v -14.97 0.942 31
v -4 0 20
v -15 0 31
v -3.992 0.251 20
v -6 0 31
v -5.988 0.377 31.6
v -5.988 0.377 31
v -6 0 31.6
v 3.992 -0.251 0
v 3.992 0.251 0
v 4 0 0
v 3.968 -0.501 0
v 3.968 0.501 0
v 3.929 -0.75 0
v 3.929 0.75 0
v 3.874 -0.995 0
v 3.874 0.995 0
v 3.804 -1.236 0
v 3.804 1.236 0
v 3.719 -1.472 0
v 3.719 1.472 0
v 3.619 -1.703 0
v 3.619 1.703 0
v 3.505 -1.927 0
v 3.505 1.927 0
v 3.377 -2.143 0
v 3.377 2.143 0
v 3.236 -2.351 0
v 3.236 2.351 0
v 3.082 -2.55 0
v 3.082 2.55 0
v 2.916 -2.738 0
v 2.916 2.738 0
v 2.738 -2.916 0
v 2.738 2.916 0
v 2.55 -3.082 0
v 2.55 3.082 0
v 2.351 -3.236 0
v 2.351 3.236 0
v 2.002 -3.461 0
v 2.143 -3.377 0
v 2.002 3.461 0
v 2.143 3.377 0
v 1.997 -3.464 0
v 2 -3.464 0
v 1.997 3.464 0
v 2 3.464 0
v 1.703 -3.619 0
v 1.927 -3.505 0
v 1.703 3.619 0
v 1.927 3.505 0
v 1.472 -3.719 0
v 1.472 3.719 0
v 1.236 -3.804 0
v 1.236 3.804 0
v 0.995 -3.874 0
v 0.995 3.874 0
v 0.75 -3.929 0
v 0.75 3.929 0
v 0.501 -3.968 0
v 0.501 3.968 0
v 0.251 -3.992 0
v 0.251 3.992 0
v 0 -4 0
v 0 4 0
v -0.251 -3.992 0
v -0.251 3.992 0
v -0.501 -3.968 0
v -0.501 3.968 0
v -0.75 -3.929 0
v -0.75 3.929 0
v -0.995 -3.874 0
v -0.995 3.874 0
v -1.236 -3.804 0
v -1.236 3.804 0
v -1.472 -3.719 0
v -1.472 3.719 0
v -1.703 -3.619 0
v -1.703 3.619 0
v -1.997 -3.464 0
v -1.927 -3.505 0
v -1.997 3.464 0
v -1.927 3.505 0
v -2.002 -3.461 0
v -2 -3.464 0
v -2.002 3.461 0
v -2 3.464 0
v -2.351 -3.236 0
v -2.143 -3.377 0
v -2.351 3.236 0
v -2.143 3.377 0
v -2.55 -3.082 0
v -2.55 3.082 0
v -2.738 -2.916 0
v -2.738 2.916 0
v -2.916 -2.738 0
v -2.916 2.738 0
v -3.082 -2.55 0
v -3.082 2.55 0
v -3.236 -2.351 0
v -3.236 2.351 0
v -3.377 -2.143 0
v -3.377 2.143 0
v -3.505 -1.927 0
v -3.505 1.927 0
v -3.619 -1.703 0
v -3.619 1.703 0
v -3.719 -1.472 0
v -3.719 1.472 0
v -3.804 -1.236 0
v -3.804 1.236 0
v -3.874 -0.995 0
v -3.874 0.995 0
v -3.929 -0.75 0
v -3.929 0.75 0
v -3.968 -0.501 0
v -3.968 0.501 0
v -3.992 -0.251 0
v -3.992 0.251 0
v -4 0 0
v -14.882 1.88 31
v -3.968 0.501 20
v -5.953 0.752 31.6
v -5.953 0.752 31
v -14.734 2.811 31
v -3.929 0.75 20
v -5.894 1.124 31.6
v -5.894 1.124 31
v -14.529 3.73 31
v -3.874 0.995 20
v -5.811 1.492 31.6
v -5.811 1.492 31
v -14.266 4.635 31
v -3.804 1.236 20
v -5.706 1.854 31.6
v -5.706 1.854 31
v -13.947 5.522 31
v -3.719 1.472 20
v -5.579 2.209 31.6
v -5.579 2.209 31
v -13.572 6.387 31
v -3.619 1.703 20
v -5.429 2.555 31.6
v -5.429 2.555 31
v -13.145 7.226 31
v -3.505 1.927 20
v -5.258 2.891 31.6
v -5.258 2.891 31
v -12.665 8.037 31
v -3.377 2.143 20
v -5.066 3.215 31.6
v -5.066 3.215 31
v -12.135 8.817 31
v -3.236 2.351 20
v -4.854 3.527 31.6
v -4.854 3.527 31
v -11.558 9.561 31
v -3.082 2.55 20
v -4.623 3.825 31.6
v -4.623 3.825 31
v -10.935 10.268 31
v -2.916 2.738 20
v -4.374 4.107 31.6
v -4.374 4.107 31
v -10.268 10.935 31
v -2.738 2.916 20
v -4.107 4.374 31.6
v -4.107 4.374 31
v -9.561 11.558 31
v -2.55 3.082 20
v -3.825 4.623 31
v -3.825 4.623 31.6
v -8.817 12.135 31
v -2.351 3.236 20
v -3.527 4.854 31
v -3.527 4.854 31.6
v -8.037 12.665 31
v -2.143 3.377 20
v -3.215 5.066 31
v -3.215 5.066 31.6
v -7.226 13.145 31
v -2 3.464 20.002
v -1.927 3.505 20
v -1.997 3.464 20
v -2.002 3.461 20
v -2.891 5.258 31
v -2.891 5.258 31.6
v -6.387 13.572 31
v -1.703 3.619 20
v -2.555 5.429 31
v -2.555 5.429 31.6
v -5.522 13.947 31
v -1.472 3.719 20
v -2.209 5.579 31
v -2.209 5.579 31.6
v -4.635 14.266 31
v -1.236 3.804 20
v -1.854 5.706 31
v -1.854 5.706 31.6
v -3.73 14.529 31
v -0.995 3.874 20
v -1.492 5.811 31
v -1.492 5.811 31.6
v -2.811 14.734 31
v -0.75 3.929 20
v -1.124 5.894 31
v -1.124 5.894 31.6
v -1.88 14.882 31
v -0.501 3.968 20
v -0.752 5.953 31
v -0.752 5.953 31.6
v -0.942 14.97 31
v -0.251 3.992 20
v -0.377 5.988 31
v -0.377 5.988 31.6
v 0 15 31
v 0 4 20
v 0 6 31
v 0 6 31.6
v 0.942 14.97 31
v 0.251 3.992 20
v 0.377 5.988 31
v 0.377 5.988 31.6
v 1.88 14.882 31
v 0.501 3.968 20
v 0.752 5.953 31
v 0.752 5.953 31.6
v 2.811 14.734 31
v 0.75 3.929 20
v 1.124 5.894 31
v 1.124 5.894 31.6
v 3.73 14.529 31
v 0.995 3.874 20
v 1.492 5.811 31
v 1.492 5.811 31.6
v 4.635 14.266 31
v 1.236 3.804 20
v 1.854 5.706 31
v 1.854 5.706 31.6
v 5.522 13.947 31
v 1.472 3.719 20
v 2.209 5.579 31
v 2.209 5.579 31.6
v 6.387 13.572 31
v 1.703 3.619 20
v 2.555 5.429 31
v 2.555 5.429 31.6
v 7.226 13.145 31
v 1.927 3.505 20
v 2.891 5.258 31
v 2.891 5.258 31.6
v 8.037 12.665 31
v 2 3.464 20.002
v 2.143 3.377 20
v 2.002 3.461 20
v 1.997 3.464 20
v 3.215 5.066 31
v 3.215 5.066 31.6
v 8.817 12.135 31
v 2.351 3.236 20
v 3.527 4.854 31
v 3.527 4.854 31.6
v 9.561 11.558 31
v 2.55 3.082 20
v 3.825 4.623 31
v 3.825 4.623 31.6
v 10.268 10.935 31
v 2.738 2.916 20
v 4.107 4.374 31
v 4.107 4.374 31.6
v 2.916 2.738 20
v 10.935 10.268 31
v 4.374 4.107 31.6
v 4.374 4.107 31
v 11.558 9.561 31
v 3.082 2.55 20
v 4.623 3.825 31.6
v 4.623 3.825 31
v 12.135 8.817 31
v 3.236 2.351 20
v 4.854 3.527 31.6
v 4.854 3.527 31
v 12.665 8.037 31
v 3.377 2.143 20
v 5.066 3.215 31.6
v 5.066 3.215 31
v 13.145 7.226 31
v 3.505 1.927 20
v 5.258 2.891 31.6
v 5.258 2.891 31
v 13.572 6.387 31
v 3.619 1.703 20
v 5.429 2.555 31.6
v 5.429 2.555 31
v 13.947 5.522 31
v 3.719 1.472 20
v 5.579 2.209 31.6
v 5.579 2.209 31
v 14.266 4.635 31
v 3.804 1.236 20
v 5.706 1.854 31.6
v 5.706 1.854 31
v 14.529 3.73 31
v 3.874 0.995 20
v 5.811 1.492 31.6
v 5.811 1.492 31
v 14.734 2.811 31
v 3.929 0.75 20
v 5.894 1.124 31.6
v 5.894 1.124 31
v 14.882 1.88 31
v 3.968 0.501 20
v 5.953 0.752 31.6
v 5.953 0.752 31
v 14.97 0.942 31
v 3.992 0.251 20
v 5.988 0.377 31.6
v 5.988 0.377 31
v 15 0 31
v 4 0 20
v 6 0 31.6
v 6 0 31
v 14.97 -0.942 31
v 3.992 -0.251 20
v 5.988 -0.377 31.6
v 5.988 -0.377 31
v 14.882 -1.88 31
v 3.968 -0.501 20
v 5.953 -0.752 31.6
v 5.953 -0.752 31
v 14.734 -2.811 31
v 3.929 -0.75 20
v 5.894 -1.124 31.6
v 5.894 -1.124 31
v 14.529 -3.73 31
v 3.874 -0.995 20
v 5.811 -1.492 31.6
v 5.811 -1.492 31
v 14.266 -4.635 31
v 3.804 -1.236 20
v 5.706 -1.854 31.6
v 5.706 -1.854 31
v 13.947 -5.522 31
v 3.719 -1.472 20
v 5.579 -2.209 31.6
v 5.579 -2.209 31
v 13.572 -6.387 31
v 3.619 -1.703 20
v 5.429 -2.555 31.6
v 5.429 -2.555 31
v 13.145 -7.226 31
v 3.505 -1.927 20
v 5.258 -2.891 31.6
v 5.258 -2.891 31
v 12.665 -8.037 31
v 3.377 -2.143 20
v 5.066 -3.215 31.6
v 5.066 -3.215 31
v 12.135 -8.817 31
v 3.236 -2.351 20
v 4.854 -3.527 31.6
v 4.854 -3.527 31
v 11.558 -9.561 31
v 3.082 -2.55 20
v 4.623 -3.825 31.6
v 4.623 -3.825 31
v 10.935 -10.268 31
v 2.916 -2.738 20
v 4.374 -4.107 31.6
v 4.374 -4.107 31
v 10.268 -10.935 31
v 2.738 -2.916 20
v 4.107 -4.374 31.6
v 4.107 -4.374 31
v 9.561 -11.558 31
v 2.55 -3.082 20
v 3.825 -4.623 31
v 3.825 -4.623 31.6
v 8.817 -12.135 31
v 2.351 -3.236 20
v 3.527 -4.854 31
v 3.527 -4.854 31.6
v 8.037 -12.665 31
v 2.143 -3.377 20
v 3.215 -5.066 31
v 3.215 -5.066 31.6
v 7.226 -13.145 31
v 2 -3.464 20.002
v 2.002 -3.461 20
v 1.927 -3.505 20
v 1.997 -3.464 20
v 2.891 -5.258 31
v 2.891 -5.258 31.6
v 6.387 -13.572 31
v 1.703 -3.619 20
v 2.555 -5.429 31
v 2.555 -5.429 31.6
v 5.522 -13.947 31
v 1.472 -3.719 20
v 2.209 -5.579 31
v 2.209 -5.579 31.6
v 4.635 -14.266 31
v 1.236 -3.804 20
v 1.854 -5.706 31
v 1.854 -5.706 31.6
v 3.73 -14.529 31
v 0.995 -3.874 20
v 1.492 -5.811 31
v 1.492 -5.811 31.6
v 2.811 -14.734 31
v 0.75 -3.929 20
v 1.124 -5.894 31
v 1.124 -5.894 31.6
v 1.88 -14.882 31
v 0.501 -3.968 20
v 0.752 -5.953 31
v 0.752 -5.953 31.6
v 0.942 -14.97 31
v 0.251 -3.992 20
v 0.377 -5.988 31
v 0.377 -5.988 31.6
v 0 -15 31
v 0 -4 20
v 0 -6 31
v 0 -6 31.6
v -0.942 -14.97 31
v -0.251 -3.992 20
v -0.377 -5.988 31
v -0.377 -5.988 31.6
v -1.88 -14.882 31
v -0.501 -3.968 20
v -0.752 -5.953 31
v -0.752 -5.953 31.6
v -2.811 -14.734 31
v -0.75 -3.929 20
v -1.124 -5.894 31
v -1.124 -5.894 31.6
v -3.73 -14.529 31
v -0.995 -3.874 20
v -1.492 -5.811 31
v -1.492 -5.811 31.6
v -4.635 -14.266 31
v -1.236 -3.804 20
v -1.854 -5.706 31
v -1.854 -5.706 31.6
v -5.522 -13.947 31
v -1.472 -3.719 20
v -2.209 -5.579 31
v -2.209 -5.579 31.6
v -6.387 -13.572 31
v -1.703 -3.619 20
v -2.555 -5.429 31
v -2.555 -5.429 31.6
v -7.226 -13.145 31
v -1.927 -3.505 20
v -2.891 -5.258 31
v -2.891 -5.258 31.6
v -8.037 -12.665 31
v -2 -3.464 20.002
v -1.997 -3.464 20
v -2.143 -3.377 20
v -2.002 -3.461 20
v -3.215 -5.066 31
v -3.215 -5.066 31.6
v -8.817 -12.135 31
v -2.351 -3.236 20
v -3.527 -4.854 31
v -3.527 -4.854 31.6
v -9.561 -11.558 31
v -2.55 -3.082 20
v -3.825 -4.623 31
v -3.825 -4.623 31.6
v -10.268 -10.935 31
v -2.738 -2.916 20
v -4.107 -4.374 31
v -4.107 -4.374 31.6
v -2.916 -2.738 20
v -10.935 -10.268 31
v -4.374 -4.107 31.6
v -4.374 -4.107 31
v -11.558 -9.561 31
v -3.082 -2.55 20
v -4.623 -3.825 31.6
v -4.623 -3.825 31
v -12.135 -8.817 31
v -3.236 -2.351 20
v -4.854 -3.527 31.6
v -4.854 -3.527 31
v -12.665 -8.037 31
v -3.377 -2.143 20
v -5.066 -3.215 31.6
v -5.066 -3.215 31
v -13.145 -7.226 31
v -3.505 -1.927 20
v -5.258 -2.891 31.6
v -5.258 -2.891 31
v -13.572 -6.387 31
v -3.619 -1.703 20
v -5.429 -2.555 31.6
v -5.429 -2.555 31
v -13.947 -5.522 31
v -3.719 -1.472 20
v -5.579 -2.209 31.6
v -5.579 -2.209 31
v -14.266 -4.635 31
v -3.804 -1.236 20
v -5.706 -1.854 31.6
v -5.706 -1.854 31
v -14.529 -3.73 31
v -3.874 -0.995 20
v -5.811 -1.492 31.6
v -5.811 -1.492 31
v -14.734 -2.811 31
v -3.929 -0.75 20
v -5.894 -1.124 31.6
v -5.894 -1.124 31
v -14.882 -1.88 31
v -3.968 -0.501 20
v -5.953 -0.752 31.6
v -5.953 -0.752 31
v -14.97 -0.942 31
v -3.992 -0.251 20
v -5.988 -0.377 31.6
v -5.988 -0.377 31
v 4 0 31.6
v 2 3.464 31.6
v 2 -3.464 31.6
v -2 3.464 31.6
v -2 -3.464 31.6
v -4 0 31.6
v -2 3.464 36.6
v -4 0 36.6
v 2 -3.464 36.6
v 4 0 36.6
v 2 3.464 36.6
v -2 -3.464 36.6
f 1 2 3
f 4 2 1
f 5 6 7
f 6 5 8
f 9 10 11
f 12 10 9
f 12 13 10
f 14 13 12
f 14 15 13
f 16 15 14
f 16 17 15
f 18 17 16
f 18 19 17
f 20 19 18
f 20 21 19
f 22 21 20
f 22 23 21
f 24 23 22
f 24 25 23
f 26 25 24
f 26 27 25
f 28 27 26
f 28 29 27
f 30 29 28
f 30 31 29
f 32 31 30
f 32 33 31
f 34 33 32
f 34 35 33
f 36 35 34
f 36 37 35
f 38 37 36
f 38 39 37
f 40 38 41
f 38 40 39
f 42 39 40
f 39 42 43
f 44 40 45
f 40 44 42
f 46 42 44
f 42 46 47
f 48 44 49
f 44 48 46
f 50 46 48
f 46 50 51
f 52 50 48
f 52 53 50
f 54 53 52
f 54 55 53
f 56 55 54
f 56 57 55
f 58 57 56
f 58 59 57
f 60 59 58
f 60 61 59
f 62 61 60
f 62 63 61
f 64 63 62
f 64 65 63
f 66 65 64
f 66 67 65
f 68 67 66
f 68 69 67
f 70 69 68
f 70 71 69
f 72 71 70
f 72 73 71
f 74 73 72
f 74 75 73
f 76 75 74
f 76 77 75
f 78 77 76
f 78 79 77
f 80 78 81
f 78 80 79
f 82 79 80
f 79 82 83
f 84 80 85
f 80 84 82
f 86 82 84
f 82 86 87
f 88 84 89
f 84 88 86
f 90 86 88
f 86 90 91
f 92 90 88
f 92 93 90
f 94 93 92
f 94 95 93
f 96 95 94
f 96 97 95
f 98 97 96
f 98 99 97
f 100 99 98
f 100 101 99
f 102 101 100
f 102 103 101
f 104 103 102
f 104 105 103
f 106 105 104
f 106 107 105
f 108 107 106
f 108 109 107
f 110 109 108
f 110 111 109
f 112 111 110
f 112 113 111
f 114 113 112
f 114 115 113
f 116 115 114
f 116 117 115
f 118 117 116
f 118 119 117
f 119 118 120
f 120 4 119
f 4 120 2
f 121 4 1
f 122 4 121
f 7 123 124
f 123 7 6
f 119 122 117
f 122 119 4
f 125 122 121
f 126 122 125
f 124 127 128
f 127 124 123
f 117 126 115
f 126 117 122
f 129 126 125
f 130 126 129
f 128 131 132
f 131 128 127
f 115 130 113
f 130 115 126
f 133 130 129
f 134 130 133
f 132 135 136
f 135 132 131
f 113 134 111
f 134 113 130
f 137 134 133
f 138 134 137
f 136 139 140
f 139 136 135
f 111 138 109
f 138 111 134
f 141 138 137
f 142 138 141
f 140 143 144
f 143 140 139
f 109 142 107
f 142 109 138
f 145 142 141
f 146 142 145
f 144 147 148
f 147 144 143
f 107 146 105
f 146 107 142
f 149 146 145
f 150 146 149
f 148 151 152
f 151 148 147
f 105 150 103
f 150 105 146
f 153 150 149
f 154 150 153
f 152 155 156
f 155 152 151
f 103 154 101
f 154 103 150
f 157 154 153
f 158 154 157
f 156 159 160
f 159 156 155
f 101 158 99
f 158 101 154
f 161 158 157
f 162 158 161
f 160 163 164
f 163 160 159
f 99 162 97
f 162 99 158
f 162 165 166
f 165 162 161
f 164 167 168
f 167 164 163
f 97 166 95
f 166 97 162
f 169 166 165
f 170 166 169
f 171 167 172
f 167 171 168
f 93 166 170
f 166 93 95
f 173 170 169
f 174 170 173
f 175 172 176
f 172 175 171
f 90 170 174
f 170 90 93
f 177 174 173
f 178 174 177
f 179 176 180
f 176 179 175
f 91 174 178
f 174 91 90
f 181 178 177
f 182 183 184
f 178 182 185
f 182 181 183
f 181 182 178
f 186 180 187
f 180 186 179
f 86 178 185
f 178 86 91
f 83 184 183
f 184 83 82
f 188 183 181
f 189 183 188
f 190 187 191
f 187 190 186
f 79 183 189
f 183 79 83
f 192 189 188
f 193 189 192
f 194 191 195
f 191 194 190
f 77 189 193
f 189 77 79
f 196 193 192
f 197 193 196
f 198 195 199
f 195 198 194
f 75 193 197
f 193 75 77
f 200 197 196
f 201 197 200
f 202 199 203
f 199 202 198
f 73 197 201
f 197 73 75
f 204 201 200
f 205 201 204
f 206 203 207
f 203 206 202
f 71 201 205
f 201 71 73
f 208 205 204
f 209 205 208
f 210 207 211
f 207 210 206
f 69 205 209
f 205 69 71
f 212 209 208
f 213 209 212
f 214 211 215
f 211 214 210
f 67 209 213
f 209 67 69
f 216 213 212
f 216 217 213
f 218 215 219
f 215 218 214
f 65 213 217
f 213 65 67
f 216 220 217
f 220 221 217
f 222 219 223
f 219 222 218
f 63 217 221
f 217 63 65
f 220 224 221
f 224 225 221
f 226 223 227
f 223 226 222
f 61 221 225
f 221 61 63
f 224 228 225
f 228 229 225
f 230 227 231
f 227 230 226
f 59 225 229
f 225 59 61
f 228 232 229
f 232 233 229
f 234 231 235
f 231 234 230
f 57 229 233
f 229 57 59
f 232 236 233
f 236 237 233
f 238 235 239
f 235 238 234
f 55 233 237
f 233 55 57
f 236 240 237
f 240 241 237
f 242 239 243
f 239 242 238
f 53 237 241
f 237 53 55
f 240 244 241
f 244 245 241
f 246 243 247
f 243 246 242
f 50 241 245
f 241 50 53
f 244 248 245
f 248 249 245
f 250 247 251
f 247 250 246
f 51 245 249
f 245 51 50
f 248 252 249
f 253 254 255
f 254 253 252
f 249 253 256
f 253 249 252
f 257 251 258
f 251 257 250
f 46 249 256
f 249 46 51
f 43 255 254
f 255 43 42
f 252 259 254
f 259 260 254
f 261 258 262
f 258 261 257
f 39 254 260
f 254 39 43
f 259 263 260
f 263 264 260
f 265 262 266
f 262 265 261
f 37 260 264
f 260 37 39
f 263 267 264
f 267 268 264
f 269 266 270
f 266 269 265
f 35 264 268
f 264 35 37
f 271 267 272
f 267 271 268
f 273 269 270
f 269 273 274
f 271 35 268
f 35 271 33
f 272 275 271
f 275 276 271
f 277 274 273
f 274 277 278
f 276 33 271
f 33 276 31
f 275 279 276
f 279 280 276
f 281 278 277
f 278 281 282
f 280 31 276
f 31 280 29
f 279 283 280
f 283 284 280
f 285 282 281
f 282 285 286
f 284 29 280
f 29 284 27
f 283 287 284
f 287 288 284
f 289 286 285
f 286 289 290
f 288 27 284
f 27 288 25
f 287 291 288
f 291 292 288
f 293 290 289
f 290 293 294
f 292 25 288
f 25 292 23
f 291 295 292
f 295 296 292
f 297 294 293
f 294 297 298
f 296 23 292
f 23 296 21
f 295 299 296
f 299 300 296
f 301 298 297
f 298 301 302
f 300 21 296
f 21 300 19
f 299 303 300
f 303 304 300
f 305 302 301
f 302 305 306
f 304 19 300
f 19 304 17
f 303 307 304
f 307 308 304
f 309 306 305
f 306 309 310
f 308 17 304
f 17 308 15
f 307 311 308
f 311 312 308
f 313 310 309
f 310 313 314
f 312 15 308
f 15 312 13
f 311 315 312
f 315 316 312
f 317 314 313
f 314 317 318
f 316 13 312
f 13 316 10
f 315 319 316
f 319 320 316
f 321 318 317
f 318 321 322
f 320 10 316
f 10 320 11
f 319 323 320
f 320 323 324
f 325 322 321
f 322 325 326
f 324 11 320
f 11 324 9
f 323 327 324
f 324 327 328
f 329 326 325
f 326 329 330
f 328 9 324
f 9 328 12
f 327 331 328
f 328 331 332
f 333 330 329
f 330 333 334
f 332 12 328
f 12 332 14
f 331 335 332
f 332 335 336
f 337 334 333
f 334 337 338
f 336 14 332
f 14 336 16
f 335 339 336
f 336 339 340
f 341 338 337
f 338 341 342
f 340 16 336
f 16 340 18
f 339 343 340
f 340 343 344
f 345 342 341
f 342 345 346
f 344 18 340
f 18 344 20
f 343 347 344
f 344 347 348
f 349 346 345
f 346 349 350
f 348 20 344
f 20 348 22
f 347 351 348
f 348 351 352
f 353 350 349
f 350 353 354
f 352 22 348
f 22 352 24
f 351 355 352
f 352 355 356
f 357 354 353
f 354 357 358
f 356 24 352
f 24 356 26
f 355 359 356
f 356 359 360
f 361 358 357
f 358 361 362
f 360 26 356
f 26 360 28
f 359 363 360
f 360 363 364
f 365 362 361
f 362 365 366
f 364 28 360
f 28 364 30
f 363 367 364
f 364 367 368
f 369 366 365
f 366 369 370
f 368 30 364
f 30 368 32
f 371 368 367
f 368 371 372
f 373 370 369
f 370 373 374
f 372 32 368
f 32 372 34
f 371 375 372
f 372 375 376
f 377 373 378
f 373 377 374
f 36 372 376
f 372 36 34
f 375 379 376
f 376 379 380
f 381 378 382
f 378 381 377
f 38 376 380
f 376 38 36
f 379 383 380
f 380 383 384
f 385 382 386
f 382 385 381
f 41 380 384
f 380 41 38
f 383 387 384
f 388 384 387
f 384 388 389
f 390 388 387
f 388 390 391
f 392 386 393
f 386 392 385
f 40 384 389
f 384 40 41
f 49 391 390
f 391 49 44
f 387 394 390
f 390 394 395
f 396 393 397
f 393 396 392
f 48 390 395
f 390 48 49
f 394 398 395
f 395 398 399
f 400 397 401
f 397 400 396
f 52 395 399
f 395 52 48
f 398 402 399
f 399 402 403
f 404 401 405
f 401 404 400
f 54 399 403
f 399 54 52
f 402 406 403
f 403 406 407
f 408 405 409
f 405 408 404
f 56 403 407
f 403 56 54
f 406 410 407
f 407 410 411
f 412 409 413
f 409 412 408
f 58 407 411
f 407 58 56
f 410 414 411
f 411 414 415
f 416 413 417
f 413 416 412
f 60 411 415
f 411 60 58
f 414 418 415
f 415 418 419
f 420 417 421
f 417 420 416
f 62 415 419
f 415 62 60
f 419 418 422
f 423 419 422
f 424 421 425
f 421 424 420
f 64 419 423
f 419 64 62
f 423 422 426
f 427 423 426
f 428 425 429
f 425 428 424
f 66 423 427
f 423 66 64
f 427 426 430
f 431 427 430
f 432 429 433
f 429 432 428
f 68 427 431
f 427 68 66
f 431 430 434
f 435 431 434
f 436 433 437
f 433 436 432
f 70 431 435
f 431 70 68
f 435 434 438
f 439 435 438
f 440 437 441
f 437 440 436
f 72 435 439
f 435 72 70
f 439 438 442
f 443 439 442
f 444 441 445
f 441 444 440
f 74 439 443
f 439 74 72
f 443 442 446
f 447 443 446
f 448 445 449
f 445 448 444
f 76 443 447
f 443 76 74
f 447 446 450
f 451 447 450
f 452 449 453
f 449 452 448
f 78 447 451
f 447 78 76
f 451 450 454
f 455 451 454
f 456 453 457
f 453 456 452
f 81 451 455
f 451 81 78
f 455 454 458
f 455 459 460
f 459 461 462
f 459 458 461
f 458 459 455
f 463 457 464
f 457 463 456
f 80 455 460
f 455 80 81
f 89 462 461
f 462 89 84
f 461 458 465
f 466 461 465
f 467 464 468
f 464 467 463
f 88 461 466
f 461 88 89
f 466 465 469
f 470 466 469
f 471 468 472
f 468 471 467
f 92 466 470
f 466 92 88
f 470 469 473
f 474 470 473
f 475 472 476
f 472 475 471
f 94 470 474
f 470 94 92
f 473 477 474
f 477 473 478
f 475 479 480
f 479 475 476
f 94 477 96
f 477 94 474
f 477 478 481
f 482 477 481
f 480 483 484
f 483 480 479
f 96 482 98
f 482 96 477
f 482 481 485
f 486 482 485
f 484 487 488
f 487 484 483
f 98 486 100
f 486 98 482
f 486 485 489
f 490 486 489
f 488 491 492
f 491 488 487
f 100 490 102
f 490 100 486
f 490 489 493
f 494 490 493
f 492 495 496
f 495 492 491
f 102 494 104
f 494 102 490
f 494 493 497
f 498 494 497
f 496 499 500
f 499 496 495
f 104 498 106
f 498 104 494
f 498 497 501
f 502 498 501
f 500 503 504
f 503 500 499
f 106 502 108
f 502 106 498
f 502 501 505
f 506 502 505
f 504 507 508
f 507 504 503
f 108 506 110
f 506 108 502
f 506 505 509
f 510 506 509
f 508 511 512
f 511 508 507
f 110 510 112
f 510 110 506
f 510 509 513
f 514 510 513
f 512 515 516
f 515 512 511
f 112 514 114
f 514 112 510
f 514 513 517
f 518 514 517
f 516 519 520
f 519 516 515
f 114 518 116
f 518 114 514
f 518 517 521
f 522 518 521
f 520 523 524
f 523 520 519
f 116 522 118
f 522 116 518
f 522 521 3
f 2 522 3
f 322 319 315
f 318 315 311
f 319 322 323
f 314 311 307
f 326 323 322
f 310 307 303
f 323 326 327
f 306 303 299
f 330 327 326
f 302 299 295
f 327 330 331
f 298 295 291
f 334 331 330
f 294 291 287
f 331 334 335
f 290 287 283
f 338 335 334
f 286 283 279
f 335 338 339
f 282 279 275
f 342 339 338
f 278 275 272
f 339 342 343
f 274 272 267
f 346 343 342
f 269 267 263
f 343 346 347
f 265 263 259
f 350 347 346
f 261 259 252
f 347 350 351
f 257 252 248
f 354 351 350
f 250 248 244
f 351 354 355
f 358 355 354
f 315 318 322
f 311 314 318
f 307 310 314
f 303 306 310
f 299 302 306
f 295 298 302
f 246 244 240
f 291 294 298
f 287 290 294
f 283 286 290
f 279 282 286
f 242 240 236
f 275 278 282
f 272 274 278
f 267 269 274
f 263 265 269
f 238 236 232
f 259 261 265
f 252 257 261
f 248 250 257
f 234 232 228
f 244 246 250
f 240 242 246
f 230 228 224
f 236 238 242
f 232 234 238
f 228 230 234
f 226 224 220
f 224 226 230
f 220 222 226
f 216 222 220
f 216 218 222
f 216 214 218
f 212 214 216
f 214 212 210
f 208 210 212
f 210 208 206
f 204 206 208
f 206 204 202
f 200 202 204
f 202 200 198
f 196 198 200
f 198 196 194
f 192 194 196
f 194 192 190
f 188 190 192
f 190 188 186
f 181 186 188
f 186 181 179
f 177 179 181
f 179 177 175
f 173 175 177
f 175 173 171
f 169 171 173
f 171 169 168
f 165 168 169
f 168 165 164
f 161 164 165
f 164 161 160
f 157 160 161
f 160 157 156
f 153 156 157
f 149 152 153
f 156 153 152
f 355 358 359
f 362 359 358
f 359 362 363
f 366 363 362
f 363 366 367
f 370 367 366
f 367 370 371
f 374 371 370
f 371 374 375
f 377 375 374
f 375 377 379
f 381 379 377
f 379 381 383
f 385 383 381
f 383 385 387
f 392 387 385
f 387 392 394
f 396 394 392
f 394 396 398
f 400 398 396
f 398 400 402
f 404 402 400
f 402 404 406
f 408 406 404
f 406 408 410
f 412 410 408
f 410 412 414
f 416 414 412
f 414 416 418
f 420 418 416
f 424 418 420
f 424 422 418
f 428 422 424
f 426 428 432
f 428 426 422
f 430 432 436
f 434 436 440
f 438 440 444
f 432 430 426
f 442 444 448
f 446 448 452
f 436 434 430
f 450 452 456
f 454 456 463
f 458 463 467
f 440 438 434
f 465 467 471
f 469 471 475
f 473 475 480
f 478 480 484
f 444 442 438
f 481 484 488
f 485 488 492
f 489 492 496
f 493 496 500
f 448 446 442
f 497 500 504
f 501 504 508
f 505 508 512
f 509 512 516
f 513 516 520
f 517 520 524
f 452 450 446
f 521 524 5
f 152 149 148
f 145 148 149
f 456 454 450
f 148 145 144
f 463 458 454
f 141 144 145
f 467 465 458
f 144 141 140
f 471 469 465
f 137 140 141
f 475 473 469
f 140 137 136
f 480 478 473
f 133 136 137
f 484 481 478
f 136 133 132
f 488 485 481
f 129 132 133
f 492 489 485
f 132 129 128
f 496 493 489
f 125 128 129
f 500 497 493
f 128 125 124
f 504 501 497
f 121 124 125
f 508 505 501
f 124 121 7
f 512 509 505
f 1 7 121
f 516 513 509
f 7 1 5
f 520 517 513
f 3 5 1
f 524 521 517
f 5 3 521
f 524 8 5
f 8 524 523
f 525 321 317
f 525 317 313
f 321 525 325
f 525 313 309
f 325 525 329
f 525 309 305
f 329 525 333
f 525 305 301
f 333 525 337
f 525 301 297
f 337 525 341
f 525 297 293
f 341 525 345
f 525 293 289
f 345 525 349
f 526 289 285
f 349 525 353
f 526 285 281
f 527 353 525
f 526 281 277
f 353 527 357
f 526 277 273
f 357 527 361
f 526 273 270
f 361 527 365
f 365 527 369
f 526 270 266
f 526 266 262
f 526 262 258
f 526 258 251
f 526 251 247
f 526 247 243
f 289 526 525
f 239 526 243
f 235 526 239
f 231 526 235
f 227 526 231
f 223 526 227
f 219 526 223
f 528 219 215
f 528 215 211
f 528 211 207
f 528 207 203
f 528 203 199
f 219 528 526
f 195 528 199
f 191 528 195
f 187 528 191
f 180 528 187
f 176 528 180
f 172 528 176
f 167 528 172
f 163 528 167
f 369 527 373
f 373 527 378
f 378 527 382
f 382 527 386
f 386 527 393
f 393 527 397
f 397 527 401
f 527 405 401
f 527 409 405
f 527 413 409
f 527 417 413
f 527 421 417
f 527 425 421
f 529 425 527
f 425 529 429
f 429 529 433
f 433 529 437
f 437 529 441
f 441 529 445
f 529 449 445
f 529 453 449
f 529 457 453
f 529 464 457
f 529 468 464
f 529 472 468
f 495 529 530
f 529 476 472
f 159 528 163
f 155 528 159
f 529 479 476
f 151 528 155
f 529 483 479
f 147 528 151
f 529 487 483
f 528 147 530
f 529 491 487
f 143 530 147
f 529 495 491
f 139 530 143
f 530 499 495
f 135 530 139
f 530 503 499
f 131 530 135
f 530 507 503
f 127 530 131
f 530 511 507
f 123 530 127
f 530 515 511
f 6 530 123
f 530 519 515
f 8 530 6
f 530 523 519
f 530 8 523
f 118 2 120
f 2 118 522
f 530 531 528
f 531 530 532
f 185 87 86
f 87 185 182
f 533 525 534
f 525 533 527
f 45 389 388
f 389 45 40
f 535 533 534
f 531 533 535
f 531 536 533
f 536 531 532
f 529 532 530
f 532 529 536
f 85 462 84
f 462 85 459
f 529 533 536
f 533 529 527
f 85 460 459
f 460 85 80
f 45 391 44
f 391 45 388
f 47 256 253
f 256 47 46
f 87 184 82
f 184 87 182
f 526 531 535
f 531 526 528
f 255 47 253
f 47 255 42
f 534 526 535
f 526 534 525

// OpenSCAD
$fn=100;
rotate_extrude () {
    polygon (points = [[0,0], [4,0], [4,20], [15,31],[6,31],[6,31.6],[0,31.6]]);
}
linear_extrude (36.6) circle (4, $fn=6);
